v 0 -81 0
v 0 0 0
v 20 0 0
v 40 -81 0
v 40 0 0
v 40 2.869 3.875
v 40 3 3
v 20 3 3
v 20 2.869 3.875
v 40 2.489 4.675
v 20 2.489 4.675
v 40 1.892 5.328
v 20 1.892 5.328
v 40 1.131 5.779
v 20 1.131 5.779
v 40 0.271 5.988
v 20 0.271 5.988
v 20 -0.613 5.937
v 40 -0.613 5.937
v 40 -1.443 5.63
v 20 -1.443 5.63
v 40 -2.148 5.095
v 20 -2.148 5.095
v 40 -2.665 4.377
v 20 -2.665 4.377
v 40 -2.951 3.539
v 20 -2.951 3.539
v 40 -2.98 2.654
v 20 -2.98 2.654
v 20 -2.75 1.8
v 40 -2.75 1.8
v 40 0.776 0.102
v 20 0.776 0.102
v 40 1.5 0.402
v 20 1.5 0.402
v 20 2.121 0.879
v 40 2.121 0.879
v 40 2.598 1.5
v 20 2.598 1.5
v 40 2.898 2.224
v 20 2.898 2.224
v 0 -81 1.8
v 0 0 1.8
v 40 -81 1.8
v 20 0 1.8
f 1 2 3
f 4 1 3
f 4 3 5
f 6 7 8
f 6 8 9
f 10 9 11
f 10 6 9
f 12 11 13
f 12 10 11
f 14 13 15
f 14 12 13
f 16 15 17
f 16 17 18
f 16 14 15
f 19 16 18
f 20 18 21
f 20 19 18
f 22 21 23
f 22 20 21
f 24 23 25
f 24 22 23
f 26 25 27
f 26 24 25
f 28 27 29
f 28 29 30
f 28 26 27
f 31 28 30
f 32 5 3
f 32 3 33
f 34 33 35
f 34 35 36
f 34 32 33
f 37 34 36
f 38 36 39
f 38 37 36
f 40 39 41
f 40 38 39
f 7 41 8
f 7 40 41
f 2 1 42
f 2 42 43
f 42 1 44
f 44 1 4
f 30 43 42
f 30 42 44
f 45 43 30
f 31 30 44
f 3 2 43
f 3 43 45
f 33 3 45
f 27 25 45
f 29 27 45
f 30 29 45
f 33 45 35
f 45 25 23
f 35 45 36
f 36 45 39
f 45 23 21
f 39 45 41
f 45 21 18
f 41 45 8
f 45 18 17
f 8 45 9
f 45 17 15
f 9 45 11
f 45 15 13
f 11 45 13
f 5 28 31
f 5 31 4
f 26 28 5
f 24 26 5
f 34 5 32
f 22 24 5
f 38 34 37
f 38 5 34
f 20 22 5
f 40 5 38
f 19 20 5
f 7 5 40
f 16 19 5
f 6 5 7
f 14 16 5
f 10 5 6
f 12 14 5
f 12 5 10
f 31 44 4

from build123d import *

# Parameters (mm, degrees)
F0_W     = 40
F0_H     = 81
F1_DEPTH = 1.8
F3_DEPTH = 20


with BuildPart() as f1:
    # F0 (on Top) → F1 (new body)
    with BuildSketch(Plane.XY):
        with Locations((20, -40.5)):
            Rectangle(F0_W, F0_H)
    extrude(amount=F1_DEPTH)

    # F2 (on face) → F3 (join)
    with BuildSketch(Plane.YZ.offset(40)):
        with BuildLine():
            Line((0, 1.8), (0, 0))
            ThreePointArc((0, 0), (2.1213203436, 0.8786796564), (3, 3))
            ThreePointArc((3, 3), (-0.6129289311, 5.9367189388), (-2.749545417, 1.8))
            Line((-2.749545417, 1.8), (0, 1.8))
        make_face()
        with BuildLine():
            ThreePointArc((-2.749545417, 1.8), (-1.6431676725, 0.4900199204), (0, 0))
            Line((0, 0), (0, 1.8))
            Line((0, 1.8), (-2.749545417, 1.8))
        make_face()
    extrude(amount=-F3_DEPTH)


solid = f1.part
